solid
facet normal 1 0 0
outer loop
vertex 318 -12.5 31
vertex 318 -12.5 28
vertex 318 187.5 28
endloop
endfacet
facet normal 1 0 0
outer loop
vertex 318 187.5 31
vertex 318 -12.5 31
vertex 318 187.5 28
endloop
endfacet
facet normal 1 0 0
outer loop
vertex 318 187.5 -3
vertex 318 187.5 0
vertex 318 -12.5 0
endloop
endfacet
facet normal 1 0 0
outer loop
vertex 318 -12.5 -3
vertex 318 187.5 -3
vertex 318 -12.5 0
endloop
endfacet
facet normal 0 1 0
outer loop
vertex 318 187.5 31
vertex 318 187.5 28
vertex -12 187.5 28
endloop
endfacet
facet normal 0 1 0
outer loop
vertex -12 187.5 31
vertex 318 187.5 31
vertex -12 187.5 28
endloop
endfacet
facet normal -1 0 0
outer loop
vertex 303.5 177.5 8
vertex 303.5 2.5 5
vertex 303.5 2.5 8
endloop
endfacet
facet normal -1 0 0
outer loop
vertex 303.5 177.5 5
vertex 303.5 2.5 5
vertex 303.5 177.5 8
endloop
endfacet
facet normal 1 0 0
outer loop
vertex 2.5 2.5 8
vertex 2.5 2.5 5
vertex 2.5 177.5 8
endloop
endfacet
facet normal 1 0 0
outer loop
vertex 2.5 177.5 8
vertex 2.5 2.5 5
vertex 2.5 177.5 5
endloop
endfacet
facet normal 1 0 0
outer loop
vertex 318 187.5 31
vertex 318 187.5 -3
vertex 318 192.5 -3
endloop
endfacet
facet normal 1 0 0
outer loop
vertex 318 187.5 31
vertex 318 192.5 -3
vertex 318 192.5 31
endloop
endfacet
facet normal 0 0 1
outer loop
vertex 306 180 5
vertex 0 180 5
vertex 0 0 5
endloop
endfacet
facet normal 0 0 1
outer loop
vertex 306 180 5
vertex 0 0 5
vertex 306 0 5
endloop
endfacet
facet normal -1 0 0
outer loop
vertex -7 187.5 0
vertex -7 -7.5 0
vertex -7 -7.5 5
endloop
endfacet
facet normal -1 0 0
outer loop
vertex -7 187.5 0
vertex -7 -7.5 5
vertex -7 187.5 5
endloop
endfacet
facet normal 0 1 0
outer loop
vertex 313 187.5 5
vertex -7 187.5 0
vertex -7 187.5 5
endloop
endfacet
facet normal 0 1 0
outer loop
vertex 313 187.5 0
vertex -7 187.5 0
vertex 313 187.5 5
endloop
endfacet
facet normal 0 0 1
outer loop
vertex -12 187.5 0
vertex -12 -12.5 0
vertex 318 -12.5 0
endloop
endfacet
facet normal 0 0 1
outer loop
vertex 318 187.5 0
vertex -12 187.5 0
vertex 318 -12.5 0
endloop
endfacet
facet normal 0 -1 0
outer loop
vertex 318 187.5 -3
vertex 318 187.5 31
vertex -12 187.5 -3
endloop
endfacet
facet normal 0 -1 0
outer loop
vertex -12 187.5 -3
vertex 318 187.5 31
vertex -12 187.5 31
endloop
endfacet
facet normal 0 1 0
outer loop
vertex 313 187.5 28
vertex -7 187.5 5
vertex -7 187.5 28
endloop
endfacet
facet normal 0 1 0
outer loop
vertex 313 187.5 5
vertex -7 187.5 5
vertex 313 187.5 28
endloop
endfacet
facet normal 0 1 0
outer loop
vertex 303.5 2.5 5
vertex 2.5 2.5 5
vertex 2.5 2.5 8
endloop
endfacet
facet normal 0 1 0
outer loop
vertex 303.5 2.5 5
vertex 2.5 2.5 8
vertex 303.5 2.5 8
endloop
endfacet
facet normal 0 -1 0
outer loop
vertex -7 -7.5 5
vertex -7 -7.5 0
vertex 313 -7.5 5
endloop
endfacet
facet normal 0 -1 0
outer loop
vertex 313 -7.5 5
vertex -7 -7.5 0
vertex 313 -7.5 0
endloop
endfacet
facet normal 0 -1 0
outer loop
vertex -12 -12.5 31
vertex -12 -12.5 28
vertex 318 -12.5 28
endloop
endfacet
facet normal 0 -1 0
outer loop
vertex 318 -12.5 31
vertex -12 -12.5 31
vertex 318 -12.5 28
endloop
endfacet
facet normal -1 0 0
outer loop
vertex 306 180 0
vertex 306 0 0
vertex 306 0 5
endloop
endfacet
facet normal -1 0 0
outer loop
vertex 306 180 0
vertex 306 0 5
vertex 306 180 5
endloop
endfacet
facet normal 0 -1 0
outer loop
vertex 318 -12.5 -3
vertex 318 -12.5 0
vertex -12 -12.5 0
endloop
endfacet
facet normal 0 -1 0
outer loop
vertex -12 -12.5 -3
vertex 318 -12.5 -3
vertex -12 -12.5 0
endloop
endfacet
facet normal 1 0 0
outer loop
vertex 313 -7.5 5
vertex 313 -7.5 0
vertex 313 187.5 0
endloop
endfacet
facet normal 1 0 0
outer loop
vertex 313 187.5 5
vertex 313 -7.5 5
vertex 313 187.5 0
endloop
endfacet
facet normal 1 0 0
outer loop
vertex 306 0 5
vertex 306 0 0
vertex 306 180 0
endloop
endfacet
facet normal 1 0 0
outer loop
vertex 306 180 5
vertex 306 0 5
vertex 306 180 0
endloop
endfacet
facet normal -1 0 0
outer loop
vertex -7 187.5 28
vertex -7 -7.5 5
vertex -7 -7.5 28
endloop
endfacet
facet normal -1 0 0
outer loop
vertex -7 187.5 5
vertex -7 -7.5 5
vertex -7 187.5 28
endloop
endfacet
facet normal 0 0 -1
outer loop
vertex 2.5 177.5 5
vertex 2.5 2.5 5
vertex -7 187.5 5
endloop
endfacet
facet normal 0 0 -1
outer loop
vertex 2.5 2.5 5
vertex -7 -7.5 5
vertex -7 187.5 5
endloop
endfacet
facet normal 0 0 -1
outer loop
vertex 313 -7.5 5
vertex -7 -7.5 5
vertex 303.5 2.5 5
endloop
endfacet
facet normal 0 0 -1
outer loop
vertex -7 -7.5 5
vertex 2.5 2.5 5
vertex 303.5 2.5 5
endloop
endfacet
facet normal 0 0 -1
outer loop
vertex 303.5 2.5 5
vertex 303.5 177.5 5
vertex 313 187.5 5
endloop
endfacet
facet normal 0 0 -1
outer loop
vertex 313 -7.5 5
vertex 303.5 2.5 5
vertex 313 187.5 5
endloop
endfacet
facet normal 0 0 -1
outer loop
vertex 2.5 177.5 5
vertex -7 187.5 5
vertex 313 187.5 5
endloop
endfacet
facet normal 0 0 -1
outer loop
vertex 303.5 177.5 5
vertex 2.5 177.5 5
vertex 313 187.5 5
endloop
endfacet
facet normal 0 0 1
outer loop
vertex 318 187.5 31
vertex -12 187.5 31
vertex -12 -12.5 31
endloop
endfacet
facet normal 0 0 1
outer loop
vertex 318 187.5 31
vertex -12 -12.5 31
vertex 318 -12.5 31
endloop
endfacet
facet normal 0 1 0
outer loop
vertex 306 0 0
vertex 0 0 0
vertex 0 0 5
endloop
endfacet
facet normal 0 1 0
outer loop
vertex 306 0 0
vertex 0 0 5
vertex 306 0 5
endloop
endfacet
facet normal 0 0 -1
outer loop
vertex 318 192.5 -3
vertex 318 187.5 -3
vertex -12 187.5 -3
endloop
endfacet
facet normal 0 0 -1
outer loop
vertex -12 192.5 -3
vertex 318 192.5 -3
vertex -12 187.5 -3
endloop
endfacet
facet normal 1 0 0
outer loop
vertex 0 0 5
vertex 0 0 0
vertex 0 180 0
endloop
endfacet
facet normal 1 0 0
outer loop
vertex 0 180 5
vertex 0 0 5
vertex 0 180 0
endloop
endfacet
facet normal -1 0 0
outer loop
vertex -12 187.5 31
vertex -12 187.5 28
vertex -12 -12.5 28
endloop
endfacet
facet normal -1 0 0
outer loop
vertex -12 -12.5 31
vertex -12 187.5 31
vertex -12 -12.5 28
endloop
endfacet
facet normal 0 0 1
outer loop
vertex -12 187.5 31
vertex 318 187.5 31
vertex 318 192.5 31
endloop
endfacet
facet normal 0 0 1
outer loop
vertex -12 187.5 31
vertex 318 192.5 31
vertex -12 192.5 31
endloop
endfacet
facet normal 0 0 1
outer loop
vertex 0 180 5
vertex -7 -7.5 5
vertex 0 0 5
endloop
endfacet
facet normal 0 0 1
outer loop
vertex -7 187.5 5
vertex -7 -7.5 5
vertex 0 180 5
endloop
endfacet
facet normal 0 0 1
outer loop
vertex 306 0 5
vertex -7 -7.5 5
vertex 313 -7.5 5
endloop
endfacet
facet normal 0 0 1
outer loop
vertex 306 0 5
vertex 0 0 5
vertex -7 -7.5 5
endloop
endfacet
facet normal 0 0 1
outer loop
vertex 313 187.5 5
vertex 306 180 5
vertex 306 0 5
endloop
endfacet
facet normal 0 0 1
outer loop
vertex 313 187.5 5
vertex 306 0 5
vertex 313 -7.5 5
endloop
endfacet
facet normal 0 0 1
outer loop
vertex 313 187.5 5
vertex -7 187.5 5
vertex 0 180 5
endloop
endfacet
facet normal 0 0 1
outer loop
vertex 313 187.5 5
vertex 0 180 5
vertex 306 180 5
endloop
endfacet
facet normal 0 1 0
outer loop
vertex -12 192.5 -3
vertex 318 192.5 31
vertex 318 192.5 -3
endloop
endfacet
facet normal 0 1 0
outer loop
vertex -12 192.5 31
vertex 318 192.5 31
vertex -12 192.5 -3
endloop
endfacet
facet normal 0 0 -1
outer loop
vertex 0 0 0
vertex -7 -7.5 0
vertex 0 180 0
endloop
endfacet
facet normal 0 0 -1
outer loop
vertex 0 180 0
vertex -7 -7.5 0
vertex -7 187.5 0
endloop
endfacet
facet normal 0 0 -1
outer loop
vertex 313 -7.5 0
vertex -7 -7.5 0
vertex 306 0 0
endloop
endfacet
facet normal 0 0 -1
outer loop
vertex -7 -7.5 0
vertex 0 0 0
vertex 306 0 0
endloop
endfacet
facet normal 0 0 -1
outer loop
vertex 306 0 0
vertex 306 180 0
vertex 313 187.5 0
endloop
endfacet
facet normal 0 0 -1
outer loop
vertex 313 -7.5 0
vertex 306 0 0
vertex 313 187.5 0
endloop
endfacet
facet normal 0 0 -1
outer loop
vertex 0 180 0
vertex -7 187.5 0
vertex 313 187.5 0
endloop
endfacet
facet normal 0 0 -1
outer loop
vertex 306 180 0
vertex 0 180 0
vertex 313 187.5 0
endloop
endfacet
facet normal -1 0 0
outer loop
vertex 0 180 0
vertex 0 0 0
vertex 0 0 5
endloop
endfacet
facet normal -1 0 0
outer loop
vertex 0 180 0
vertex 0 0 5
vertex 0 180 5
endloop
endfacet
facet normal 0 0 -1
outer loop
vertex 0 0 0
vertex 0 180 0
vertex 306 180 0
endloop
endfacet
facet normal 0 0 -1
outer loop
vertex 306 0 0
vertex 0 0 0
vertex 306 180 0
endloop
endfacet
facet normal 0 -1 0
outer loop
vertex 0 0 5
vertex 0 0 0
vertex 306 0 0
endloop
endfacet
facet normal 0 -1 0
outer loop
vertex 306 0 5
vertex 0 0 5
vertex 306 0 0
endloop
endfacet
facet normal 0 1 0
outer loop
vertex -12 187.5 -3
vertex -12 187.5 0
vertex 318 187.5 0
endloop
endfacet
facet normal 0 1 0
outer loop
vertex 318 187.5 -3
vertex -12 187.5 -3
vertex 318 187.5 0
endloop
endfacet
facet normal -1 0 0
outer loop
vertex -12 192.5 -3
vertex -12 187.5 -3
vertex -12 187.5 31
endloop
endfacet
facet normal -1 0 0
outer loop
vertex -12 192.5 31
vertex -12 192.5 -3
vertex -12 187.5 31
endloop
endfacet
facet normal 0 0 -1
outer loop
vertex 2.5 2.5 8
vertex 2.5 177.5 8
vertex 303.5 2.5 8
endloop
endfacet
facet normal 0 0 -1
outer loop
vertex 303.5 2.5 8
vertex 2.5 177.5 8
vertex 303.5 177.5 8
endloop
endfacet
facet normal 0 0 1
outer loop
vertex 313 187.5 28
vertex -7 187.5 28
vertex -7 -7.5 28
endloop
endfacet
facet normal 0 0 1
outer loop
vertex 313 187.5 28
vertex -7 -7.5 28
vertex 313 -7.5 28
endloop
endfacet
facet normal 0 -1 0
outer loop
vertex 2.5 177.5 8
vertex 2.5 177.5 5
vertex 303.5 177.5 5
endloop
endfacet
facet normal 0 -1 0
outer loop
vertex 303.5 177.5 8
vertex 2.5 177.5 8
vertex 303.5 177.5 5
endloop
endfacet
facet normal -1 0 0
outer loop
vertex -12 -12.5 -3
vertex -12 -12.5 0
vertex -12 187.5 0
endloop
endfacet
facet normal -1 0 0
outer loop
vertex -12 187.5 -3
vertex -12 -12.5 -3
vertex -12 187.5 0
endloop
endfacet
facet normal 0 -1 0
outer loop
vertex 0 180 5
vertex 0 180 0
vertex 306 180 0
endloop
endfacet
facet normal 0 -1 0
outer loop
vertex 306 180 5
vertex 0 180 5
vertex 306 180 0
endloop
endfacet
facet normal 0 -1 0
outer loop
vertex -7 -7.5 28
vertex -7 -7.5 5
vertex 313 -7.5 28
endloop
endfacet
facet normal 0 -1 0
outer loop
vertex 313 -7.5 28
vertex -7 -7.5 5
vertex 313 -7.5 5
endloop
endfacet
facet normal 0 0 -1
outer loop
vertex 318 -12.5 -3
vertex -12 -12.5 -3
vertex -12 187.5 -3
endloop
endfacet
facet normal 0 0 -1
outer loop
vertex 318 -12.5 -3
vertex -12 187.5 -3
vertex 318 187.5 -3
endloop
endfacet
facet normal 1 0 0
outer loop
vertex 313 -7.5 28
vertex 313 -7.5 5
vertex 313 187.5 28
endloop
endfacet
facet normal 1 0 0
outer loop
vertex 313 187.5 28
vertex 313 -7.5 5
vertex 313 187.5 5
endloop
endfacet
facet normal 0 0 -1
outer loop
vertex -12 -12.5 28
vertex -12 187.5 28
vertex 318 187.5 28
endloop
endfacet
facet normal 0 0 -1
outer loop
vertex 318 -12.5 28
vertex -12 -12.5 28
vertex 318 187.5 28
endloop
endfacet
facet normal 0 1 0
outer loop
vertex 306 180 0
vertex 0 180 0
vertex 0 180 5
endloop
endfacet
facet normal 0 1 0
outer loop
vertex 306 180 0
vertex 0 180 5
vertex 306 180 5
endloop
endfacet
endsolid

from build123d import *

# Parameters (mm, degrees)
F0_W      = 306
F0_H      = 180
F1_DEPTH  = 5
F2_W      = 320
F2_H      = 195
F3_DEPTH  = 5
F5_W      = 320
F5_H      = 195
F5_H_2    = 5
F6_DEPTH  = 3
F7_W      = 320
F7_H      = 195
F7_W_2    = 301
F7_H_2    = 175
F8_DEPTH  = 3
F9_W      = 320
F9_H      = 195
F10_DEPTH = 20
F11_W     = 320
F11_H     = 5
F11_H_2   = 195
F12_DEPTH = 3
F13_W     = 330
F13_H     = 34
F14_DEPTH = 5


with BuildPart() as f1:
    # F0 (on Top) → F1 (new body)
    with BuildSketch(Plane.XY):
        with Locations((153, 90)):
            Rectangle(F0_W, F0_H)
    extrude(amount=F1_DEPTH)


with BuildPart() as f3:
    # F2 (on Top) → F3 (new body)
    with BuildSketch(Plane.XY):
        with Locations((153, 90)):
            Rectangle(F2_W, F2_H)
    extrude(amount=F3_DEPTH)

    # F4: cut F1
    add(f1.part, mode=Mode.SUBTRACT)


with BuildPart() as f6:
    # F5 (on face) → F6 (new body)
    with BuildSketch(Plane(origin=(0, 0, 0), x_dir=(1, 0, 0), z_dir=(0, 0, -1))):
        with Locations((153, -90)):
            Rectangle(F5_W, F5_H)
        Polygon((313, 7.5), (313, -187.5), (318, -187.5), (318, 12.5), (313, 12.5), align=None)
        Polygon((-12, -187.5), (-7, -187.5), (-7, 7.5), (-7, 12.5), (-12, 12.5), align=None)
        with Locations((153, 10)):
            Rectangle(F5_W, F5_H_2)
    extrude(amount=F6_DEPTH)


with BuildPart() as f8:
    # F7 (on face) → F8 (new body)
    with BuildSketch(Plane.XY.offset(5)):
        with Locations((153, 90)):
            Rectangle(F7_W, F7_H)
        with Locations((153, 90)):
            Rectangle(F7_W_2, F7_H_2, mode=Mode.SUBTRACT)
    extrude(amount=F8_DEPTH)

    # F9 (on face) → F10 (join)
    with BuildSketch(Plane.XY.offset(8)):
        with Locations((153, 90)):
            Rectangle(F9_W, F9_H)
    extrude(amount=F10_DEPTH)


with BuildPart() as f12:
    # F11 (on face) → F12 (new body)
    with BuildSketch(Plane.XY.offset(28)):
        with Locations((153, -10)):
            Rectangle(F11_W, F11_H)
        with Locations((153, 90)):
            Rectangle(F11_W, F11_H_2)
        Polygon((313, 187.5), (313, -7.5), (313, -12.5), (318, -12.5), (318, 187.5), align=None)
        Polygon((-7, -12.5), (-7, -7.5), (-7, 187.5), (-12, 187.5), (-12, -12.5), align=None)
    extrude(amount=F12_DEPTH)


with BuildPart() as f14:
    # F13 (on face) → F14 (new body)
    with BuildSketch(Plane(origin=(0, 187.5, 0), x_dir=(-1, 0, 0), z_dir=(0, 1, 0))):
        with Locations((-153, 14)):
            Rectangle(F13_W, F13_H)
    extrude(amount=F14_DEPTH)


solid = Compound([f1.part, f3.part, f6.part, f8.part, f12.part, f14.part])
